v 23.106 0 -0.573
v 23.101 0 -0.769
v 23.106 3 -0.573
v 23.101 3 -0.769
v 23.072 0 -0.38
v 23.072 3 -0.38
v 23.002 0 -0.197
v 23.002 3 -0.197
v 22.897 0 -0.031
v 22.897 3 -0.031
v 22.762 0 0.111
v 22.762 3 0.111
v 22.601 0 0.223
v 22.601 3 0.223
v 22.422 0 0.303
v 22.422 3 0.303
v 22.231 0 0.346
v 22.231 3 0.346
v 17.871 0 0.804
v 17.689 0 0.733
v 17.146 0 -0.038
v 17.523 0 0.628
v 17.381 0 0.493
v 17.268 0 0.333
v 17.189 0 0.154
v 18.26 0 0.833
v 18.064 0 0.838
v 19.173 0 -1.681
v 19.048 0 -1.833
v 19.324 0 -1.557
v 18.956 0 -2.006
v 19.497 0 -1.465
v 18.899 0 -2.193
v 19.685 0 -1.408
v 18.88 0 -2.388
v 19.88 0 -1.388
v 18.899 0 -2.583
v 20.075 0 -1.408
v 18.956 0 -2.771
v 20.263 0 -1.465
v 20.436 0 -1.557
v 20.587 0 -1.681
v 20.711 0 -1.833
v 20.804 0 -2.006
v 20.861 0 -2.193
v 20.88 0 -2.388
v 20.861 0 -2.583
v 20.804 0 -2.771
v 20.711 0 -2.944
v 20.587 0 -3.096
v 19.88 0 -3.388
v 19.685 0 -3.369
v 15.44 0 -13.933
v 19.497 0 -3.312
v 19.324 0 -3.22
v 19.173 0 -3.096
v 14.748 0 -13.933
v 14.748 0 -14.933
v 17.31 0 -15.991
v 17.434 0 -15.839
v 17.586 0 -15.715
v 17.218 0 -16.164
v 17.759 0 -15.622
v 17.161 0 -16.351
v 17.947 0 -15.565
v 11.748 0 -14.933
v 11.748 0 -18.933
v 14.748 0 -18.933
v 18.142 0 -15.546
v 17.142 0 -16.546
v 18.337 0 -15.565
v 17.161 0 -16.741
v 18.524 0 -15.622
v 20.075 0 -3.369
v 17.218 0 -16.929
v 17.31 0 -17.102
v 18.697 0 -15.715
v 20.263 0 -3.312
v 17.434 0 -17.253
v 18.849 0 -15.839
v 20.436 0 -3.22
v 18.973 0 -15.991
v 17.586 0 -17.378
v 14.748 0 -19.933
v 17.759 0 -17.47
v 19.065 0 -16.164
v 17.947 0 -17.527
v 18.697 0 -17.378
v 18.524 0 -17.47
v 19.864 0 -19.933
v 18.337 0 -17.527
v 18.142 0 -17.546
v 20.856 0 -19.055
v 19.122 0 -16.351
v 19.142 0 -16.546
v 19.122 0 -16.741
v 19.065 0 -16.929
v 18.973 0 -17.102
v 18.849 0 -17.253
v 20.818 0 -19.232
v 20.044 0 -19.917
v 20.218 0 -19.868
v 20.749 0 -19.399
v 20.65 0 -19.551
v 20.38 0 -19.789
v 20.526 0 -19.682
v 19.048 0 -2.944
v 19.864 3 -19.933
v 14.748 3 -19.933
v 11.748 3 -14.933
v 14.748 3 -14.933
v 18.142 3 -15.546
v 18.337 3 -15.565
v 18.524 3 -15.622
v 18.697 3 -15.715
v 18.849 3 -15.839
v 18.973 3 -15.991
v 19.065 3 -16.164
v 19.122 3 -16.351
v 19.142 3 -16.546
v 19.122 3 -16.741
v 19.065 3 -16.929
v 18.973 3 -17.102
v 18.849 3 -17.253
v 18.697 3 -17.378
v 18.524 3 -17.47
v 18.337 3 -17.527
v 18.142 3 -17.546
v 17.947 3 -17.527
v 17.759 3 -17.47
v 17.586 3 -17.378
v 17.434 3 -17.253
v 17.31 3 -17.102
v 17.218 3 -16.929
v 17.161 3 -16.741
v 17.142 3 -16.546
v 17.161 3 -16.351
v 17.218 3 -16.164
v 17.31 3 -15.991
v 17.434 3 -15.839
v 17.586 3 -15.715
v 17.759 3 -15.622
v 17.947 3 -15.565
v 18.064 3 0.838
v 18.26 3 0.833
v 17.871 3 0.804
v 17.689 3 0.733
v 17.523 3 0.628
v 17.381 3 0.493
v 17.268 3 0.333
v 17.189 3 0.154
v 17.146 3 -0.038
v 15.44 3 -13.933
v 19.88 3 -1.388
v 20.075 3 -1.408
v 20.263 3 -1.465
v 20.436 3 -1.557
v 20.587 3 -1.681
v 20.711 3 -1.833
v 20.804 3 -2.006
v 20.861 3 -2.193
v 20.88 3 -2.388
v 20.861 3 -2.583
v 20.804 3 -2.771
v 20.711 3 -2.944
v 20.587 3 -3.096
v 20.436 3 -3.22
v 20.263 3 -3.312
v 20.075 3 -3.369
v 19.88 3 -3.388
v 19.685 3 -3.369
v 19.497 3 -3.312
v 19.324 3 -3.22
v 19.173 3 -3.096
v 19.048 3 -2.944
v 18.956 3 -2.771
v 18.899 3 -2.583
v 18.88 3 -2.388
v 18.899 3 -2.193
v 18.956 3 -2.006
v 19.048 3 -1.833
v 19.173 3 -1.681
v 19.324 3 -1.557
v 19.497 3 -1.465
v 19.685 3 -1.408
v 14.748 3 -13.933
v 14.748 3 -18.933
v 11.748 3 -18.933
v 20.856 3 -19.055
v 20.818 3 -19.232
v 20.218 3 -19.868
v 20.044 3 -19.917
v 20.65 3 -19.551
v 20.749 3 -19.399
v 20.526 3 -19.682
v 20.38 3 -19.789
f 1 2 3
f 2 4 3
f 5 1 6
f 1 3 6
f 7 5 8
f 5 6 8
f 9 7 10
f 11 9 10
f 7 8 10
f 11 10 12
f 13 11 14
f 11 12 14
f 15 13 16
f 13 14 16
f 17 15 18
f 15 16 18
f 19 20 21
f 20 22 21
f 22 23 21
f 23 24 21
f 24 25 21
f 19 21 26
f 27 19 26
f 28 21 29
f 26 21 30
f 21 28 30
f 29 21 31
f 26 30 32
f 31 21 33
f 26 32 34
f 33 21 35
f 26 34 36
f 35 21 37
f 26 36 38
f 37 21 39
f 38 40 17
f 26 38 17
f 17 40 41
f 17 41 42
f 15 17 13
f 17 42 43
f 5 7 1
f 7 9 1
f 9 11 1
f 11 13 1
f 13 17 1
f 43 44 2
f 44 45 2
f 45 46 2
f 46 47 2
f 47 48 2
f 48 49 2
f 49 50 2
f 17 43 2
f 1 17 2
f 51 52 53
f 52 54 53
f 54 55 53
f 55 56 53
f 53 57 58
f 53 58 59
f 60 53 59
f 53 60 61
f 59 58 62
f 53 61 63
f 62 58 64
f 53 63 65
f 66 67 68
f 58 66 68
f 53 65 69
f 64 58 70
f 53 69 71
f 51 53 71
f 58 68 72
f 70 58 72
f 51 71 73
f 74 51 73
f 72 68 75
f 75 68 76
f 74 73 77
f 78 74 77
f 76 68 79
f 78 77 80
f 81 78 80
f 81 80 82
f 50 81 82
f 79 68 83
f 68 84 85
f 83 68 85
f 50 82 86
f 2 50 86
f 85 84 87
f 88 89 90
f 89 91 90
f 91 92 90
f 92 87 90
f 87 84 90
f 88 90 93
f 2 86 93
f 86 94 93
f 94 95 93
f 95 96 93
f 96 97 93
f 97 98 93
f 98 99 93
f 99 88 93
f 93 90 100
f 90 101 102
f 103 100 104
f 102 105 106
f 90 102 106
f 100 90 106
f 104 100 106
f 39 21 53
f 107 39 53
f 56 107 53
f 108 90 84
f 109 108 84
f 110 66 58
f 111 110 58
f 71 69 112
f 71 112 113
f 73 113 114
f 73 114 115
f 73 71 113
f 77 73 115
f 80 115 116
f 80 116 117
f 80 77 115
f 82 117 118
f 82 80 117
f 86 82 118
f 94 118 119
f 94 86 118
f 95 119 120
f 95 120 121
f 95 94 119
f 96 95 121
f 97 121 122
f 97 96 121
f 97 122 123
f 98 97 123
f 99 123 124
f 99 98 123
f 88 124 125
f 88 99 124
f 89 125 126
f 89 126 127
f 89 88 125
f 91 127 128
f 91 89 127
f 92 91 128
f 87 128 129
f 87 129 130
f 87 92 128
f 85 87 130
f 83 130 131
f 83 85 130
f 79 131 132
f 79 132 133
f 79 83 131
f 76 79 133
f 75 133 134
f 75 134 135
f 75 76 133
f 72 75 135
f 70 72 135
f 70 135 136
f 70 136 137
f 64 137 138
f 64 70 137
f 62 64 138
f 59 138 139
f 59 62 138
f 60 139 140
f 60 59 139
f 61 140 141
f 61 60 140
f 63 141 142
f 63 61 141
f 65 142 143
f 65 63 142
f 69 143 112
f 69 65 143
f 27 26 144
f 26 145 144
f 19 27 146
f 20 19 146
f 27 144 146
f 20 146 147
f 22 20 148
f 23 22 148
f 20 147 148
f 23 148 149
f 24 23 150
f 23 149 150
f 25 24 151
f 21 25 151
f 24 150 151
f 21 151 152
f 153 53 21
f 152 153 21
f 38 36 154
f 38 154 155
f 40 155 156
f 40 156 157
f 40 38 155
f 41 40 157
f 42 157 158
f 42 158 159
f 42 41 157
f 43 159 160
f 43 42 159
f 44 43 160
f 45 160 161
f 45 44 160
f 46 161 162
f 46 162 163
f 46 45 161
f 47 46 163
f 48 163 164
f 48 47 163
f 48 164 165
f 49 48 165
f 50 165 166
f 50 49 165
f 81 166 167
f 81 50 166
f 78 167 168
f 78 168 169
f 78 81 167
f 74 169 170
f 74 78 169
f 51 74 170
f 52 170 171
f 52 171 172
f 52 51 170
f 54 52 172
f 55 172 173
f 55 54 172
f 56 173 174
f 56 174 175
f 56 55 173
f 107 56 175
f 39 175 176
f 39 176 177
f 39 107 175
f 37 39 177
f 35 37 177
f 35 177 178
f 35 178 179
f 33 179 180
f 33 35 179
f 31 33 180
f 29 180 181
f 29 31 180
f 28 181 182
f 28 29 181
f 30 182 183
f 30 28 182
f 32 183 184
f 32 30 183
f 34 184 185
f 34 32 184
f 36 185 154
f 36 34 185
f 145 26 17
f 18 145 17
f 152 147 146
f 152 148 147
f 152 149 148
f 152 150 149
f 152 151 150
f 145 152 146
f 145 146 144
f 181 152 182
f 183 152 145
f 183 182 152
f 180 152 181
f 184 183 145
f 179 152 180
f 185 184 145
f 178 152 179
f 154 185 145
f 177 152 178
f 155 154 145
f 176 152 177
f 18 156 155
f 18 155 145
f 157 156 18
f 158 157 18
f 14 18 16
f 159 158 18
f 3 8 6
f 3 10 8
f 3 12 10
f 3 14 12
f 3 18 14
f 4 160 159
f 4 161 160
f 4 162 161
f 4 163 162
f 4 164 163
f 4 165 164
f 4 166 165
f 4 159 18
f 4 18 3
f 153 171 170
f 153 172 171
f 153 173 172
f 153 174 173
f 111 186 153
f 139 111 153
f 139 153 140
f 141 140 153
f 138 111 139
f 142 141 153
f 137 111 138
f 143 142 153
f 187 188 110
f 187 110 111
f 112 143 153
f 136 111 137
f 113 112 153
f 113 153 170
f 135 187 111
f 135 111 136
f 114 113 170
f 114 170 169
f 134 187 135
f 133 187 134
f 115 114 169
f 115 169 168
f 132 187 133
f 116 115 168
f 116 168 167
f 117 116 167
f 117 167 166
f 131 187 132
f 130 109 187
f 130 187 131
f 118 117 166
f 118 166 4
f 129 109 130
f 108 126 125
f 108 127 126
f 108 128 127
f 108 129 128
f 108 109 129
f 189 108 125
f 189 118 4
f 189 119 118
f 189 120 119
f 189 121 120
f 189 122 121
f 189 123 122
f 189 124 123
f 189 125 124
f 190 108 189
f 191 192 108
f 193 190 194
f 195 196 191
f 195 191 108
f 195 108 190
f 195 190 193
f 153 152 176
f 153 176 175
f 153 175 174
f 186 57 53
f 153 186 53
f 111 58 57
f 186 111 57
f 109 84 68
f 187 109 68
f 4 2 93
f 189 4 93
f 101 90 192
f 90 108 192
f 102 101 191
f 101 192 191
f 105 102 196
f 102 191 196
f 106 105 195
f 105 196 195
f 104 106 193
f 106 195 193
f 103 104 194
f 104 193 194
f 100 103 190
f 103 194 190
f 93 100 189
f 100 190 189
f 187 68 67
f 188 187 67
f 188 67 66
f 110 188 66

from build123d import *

# Parameters (mm, degrees)
SKETCH2_R           = 1
BOSS_EXTRUDE1_DEPTH = 3
FILLET1_R           = 1


with BuildPart() as part:
    # Sketch2 → Boss-Extrude1 (new body)
    with BuildSketch(Plane(origin=(0, 0, 0), x_dir=(1, 0, 0), z_dir=(0, 1, 0))):
        Polygon((20.748238747, 19.933341623), (14.748238747, 19.933341623), (14.748238747, 18.933341623), (11.748238747, 18.933341623), (11.748238747, 14.933341623), (14.748238747, 14.933341623), (14.748238747, 13.933341623), (15.43988716, 13.933341623), (17.267927311, -0.954850651), (23.22320422, -0.223634591), align=None)
        with Locations(Location((18.141595519, 16.546219938, 0), (0, 0, 270))):
            Circle(SKETCH2_R, mode=Mode.SUBTRACT)
        with Locations(Location((19.879957735, 2.388395834, 0), (0, 0, 270))):
            Circle(SKETCH2_R, mode=Mode.SUBTRACT)
    extrude(amount=BOSS_EXTRUDE1_DEPTH)

    # Fillet1
    fillet1_edges = [part.edges().sort_by_distance(p)[0] for p in [
        (20.748238747, 1.5, -19.933341623),
        (23.22320422, 1.5, 0.223634591),
        (17.267927311, 1.5, 0.954850651),
    ]]
    fillet(fillet1_edges, radius=FILLET1_R)


solid = part.part
